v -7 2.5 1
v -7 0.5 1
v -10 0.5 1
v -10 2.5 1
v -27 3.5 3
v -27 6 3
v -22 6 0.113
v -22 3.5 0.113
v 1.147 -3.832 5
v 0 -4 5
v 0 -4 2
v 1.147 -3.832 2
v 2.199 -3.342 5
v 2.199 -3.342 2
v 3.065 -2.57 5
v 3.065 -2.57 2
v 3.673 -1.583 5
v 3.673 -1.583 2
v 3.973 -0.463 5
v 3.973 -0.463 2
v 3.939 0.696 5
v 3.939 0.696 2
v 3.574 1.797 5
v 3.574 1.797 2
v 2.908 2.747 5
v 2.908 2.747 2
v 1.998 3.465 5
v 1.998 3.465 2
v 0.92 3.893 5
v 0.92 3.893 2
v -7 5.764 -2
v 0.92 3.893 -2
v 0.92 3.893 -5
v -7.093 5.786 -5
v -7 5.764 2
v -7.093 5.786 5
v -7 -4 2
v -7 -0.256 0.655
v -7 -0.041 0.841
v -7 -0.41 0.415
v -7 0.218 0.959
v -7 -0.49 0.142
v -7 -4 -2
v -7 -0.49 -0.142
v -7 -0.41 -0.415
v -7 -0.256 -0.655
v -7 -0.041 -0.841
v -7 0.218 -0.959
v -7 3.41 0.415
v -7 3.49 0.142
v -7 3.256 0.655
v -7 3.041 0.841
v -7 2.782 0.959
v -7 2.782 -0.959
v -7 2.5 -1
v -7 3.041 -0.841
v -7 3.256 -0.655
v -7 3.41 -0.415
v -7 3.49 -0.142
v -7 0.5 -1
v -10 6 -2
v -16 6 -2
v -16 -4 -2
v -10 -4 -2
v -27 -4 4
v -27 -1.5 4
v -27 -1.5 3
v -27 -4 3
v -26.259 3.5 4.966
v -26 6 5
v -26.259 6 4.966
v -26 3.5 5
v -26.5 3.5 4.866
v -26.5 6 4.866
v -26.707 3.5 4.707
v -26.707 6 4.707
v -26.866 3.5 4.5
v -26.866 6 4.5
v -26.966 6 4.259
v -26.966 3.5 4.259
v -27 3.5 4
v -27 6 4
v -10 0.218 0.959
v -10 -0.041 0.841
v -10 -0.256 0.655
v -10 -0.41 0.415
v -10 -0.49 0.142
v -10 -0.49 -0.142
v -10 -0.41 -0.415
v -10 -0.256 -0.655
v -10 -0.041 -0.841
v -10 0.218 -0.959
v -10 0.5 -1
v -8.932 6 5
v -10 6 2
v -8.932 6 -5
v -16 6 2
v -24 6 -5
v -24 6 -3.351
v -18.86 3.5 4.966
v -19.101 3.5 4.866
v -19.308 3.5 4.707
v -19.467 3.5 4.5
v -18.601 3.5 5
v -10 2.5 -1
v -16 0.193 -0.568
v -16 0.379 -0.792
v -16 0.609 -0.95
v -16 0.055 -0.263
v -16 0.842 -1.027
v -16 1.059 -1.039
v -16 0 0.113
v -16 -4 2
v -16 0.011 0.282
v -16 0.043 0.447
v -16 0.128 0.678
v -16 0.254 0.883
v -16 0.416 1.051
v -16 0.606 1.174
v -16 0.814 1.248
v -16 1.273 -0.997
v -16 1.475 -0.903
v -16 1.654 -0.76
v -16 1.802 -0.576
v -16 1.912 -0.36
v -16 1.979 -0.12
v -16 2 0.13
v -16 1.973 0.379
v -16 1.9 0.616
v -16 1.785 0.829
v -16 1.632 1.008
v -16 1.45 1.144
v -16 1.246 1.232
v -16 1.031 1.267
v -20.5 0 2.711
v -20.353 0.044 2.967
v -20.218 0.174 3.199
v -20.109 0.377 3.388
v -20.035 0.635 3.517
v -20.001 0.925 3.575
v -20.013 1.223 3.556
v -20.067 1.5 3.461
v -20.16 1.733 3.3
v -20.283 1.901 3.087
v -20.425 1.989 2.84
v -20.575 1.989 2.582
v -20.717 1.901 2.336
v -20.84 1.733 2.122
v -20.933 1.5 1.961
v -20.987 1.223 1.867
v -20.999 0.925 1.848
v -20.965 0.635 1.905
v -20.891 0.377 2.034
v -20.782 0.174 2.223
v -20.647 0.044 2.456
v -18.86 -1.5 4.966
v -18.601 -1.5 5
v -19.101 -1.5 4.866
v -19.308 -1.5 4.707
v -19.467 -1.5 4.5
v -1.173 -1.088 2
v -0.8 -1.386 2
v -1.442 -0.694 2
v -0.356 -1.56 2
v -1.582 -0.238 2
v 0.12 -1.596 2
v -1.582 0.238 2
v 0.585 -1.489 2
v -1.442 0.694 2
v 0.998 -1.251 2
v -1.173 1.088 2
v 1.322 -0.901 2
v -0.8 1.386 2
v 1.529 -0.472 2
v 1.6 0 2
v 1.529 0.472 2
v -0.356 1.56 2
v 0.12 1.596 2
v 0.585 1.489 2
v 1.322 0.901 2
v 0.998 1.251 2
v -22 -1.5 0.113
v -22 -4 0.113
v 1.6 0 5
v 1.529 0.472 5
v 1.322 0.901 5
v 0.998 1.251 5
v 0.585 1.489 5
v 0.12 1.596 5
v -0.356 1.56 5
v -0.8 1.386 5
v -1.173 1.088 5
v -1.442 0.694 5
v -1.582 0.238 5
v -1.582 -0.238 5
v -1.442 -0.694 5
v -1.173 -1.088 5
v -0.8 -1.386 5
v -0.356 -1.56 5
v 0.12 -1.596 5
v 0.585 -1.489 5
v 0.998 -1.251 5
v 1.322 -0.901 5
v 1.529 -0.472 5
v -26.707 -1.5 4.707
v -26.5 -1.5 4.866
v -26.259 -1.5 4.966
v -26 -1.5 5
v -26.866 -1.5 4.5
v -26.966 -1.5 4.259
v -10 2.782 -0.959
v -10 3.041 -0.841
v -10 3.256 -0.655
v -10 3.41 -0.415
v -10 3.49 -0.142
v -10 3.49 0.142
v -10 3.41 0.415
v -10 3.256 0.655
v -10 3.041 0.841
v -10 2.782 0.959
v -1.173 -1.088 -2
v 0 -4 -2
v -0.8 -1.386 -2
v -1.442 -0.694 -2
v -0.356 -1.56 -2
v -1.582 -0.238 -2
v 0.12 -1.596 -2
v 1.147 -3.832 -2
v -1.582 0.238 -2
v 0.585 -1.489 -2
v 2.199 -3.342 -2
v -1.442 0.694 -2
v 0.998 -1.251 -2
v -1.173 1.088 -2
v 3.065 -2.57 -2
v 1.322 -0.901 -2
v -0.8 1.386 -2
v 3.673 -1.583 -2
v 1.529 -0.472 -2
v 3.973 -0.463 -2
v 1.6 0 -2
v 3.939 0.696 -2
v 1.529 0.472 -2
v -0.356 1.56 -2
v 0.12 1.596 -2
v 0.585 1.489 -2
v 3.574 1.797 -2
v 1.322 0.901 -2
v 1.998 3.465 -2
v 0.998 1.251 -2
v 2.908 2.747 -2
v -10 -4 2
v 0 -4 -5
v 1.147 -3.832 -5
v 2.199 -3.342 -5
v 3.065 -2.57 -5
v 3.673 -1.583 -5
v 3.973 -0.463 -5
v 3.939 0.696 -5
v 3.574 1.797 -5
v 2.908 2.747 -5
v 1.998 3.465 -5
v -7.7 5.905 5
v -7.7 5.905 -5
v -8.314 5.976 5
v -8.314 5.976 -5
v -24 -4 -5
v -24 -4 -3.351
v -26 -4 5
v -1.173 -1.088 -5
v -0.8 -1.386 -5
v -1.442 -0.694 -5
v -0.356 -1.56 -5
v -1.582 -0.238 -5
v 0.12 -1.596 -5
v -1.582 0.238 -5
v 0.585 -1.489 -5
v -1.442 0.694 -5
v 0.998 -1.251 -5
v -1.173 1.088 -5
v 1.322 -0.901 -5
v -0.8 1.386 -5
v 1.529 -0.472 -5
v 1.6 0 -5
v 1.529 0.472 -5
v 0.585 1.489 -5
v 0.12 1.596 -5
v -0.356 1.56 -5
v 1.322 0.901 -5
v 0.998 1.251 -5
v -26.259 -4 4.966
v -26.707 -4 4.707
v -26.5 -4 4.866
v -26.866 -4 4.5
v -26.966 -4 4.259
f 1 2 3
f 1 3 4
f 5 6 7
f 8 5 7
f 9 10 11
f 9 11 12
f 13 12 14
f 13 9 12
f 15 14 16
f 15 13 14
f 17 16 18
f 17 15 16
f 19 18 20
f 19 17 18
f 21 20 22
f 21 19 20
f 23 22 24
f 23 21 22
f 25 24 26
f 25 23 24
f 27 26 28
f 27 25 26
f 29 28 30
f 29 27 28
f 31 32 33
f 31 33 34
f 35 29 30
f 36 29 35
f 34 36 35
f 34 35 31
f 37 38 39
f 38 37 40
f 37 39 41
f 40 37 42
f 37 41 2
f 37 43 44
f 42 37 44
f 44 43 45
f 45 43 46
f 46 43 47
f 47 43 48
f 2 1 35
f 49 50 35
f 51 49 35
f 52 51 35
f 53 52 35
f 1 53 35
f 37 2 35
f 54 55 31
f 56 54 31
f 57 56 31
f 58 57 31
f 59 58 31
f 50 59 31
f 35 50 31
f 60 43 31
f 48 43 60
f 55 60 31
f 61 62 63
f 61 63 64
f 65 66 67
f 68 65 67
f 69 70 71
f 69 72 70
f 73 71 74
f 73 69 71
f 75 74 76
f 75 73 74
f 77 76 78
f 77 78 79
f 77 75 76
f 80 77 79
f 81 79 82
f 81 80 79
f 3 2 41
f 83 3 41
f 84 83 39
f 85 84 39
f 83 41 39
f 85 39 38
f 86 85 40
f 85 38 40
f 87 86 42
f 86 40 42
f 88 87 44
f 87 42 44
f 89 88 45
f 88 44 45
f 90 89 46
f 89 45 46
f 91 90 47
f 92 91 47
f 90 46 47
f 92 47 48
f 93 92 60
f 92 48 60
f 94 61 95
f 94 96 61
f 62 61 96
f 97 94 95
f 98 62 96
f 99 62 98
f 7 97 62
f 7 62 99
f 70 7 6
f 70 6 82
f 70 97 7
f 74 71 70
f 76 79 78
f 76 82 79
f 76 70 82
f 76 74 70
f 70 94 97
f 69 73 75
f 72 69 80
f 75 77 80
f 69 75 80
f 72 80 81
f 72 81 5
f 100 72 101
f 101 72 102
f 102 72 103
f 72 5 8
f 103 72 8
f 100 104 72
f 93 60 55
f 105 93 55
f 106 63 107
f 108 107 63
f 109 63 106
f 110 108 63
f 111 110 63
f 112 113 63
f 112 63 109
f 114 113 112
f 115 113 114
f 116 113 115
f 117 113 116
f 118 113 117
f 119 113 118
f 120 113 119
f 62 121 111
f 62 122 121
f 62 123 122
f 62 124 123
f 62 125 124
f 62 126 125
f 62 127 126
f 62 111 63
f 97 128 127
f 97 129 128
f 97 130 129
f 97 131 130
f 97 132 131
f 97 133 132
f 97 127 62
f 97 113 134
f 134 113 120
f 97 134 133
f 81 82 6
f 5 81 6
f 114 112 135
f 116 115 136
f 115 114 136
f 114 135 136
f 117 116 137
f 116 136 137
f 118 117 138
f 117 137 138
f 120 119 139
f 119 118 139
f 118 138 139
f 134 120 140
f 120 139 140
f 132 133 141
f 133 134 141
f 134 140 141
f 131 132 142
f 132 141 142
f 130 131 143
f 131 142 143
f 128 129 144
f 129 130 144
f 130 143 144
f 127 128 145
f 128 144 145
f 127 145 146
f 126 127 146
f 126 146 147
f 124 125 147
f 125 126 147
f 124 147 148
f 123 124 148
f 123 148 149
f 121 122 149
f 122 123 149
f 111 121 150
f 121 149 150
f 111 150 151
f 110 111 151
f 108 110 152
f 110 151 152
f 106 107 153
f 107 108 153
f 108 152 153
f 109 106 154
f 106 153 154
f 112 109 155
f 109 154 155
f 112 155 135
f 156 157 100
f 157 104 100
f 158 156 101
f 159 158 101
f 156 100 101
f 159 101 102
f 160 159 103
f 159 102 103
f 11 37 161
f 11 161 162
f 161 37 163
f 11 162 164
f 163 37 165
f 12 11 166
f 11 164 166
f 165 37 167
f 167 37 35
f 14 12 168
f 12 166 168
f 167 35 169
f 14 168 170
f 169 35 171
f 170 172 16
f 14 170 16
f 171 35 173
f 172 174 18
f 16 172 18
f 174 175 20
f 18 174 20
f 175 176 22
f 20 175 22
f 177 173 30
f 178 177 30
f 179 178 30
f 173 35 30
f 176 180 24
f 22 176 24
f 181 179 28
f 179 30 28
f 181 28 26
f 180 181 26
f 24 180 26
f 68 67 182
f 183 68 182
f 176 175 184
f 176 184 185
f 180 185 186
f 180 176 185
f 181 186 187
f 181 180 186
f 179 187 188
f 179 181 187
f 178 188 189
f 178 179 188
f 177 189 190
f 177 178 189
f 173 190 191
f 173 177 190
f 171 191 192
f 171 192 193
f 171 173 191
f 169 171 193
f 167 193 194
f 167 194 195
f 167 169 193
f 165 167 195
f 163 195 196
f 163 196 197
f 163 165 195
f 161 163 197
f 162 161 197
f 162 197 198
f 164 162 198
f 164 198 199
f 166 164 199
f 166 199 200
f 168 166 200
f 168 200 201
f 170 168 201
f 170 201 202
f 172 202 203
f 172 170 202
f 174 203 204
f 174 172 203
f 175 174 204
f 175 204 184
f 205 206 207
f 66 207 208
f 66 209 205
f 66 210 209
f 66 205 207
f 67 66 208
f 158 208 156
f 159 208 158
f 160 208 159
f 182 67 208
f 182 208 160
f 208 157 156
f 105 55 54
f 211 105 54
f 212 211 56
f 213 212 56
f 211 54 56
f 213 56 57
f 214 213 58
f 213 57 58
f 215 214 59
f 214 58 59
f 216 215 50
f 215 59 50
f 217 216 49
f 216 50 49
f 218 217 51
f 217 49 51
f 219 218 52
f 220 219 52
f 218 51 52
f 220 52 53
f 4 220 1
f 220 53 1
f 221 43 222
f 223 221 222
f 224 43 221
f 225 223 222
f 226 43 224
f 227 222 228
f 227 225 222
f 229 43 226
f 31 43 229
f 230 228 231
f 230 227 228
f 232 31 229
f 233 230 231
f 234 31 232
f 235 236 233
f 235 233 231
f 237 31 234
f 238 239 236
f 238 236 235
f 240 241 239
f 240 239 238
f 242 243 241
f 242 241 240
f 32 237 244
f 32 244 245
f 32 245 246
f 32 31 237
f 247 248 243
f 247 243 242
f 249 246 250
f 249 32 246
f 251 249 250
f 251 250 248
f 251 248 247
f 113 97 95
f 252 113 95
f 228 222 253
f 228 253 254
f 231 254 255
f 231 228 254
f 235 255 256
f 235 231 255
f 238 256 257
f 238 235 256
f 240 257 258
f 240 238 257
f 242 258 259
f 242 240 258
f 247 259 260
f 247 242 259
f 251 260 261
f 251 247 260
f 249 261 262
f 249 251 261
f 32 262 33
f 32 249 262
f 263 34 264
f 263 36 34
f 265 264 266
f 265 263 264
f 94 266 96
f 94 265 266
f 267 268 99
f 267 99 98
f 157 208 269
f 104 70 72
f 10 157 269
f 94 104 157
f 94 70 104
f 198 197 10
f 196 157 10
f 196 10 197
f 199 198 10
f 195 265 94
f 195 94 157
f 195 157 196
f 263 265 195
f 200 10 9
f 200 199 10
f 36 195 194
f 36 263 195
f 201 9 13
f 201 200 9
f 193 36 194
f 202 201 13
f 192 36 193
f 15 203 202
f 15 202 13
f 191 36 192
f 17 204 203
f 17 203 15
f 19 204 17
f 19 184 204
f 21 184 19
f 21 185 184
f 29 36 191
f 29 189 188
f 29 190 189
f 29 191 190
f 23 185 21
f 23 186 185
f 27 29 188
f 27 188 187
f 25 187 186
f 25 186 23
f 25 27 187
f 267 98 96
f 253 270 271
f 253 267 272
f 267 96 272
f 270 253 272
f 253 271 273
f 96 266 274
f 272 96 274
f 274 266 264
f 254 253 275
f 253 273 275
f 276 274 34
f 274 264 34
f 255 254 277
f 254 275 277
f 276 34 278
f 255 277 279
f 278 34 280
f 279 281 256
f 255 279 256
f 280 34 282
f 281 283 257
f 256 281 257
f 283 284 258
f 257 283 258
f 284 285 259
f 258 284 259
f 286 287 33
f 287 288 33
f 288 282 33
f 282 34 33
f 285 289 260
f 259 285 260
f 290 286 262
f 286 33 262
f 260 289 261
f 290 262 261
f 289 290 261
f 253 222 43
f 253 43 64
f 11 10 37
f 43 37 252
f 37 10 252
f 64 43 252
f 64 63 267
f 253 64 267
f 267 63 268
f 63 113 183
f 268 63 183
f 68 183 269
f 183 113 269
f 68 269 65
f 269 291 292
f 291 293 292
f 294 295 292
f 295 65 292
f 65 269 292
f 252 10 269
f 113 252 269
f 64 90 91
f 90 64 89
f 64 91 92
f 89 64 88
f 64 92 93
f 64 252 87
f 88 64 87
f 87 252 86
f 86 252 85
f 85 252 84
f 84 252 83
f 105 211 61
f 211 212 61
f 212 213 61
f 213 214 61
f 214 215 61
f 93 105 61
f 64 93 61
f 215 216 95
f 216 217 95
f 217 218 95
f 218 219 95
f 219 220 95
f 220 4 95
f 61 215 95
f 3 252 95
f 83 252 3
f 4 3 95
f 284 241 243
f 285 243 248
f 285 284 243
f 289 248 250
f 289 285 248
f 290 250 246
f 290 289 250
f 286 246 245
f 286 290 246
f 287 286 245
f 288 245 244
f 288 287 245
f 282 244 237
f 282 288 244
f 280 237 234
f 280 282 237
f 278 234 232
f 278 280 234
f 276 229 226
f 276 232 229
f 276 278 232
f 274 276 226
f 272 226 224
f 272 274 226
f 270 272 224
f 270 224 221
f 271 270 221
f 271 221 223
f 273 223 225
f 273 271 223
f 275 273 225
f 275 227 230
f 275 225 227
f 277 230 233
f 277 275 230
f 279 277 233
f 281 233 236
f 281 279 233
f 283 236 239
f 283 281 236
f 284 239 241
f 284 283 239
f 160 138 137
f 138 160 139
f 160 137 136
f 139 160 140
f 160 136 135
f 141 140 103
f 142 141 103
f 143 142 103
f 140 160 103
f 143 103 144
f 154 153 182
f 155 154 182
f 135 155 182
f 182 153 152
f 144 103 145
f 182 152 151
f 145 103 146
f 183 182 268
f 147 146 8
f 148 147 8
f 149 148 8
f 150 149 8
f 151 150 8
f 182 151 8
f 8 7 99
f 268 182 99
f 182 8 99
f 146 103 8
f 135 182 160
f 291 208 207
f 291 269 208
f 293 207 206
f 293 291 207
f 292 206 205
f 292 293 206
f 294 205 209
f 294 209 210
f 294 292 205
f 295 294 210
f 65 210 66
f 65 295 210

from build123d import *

# Parameters (mm, degrees)
SKETCH002_W     = 13
SKETCH002_H     = 14
SKETCH002_W_2   = 6
PAD001_DEPTH    = 2
SKETCH_R        = 1.6
PAD_DEPTH       = 5
POCKET_DEPTH    = 10.001
SKETCH003_W     = 7
SKETCH003_H     = 5
POCKET001_DEPTH = 17.2330508076
SKETCH004_R     = 1
POCKET002_DEPTH = 6
POCKET003_DEPTH = 3
FILLET_R        = 8
FILLET001_R     = 1
FILLET002_R     = 1


with BuildPart() as pad001:
    # Sketch002 → Pad001 (new body, symmetric)
    with BuildSketch(Plane.XY):
        with Locations((-0.5, 0)):
            Rectangle(SKETCH002_W, SKETCH002_H)
        with Locations((-13, 0)):
            Rectangle(SKETCH002_W_2, SKETCH002_H)
    extrude(amount=PAD001_DEPTH, both=True)


with BuildPart() as fillet002:
    # Sketch → Pad (new body, symmetric)
    with BuildSketch(Plane.XY):
        with BuildLine():
            ThreePointArc((0, -4), (3.9731206567, -0.4629387079), (0.9196556715, 3.8928438764))
            Line((0.9196556715, 3.8928438764), (-8, 6))
            Line((-8, 6), (-30, 6))
            Line((-30, -4), (-30, 6))
            Line((0, -4), (-30, -4))
        make_face()
        Circle(SKETCH_R, mode=Mode.SUBTRACT)
    extrude(amount=PAD_DEPTH, both=True)

    # Sketch001 → Pocket (cut, through all)
    with BuildSketch(Plane(origin=(0, 6, 0), x_dir=(-1, 0, 0), z_dir=(0, 1, 0))):
        Polygon((22, 0.1132486541), (24, -3.3508529611), (24, -5), (30, -5), (30, 5), (27, 5), (27, 3), align=None)
    extrude(amount=-POCKET_DEPTH, mode=Mode.SUBTRACT)

    # Cut: cut Pad001
    add(pad001.part, mode=Mode.SUBTRACT)

    # Sketch003 → Pocket001 (cut, through all)
    with BuildSketch(Plane(origin=(-5.4509618943, 0, -9.4413429511), x_dir=(0.8660254038, 0, -0.5), z_dir=(-0.5, 0, -0.8660254038))):
        with Locations((-22.6091832103, -1)):
            Rectangle(SKETCH003_W, SKETCH003_H)
    extrude(amount=-POCKET001_DEPTH, mode=Mode.SUBTRACT)

    # Sketch004 → Pocket002 (cut)
    with BuildSketch(Plane(origin=(-16.5490381057, 0, 9.5545916051), x_dir=(0, -1, 0), z_dir=(-0.8660254038, 0, 0.5))):
        with Locations((-1, -7.9019237886)):
            Circle(SKETCH004_R)
    extrude(amount=-POCKET002_DEPTH, mode=Mode.SUBTRACT)

    # Sketch005 → Pocket003 (cut)
    with BuildSketch(Plane.YZ.offset(-7)):
        with BuildLine():
            Line((0.5, 1), (2.5, 1))
            ThreePointArc((2.5, -1), (3.5, 0), (2.5, 1))
            Line((0.5, -1), (2.5, -1))
            ThreePointArc((0.5, 1), (-0.5, 0), (0.5, -1))
        make_face()
    extrude(amount=-POCKET003_DEPTH, mode=Mode.SUBTRACT)

    # Fillet
    fillet_edges = [fillet002.edges().sort_by_distance(p)[0] for p in [
        (-8, 6, 0),
    ]]
    fillet(fillet_edges, radius=FILLET_R)

    # Fillet001
    fillet001_edges = [fillet002.edges().sort_by_distance(p)[0] for p in [
        (-27, 4.75, 5),
        (-27, -2.75, 5),
    ]]
    fillet(fillet001_edges, radius=FILLET001_R)

    # Fillet002
    fillet002_edges = [fillet002.edges().sort_by_distance(p)[0] for p in [
        (-19.178633, 1, 5),
    ]]
    fillet(fillet002_edges, radius=FILLET002_R)


solid = fillet002.part
